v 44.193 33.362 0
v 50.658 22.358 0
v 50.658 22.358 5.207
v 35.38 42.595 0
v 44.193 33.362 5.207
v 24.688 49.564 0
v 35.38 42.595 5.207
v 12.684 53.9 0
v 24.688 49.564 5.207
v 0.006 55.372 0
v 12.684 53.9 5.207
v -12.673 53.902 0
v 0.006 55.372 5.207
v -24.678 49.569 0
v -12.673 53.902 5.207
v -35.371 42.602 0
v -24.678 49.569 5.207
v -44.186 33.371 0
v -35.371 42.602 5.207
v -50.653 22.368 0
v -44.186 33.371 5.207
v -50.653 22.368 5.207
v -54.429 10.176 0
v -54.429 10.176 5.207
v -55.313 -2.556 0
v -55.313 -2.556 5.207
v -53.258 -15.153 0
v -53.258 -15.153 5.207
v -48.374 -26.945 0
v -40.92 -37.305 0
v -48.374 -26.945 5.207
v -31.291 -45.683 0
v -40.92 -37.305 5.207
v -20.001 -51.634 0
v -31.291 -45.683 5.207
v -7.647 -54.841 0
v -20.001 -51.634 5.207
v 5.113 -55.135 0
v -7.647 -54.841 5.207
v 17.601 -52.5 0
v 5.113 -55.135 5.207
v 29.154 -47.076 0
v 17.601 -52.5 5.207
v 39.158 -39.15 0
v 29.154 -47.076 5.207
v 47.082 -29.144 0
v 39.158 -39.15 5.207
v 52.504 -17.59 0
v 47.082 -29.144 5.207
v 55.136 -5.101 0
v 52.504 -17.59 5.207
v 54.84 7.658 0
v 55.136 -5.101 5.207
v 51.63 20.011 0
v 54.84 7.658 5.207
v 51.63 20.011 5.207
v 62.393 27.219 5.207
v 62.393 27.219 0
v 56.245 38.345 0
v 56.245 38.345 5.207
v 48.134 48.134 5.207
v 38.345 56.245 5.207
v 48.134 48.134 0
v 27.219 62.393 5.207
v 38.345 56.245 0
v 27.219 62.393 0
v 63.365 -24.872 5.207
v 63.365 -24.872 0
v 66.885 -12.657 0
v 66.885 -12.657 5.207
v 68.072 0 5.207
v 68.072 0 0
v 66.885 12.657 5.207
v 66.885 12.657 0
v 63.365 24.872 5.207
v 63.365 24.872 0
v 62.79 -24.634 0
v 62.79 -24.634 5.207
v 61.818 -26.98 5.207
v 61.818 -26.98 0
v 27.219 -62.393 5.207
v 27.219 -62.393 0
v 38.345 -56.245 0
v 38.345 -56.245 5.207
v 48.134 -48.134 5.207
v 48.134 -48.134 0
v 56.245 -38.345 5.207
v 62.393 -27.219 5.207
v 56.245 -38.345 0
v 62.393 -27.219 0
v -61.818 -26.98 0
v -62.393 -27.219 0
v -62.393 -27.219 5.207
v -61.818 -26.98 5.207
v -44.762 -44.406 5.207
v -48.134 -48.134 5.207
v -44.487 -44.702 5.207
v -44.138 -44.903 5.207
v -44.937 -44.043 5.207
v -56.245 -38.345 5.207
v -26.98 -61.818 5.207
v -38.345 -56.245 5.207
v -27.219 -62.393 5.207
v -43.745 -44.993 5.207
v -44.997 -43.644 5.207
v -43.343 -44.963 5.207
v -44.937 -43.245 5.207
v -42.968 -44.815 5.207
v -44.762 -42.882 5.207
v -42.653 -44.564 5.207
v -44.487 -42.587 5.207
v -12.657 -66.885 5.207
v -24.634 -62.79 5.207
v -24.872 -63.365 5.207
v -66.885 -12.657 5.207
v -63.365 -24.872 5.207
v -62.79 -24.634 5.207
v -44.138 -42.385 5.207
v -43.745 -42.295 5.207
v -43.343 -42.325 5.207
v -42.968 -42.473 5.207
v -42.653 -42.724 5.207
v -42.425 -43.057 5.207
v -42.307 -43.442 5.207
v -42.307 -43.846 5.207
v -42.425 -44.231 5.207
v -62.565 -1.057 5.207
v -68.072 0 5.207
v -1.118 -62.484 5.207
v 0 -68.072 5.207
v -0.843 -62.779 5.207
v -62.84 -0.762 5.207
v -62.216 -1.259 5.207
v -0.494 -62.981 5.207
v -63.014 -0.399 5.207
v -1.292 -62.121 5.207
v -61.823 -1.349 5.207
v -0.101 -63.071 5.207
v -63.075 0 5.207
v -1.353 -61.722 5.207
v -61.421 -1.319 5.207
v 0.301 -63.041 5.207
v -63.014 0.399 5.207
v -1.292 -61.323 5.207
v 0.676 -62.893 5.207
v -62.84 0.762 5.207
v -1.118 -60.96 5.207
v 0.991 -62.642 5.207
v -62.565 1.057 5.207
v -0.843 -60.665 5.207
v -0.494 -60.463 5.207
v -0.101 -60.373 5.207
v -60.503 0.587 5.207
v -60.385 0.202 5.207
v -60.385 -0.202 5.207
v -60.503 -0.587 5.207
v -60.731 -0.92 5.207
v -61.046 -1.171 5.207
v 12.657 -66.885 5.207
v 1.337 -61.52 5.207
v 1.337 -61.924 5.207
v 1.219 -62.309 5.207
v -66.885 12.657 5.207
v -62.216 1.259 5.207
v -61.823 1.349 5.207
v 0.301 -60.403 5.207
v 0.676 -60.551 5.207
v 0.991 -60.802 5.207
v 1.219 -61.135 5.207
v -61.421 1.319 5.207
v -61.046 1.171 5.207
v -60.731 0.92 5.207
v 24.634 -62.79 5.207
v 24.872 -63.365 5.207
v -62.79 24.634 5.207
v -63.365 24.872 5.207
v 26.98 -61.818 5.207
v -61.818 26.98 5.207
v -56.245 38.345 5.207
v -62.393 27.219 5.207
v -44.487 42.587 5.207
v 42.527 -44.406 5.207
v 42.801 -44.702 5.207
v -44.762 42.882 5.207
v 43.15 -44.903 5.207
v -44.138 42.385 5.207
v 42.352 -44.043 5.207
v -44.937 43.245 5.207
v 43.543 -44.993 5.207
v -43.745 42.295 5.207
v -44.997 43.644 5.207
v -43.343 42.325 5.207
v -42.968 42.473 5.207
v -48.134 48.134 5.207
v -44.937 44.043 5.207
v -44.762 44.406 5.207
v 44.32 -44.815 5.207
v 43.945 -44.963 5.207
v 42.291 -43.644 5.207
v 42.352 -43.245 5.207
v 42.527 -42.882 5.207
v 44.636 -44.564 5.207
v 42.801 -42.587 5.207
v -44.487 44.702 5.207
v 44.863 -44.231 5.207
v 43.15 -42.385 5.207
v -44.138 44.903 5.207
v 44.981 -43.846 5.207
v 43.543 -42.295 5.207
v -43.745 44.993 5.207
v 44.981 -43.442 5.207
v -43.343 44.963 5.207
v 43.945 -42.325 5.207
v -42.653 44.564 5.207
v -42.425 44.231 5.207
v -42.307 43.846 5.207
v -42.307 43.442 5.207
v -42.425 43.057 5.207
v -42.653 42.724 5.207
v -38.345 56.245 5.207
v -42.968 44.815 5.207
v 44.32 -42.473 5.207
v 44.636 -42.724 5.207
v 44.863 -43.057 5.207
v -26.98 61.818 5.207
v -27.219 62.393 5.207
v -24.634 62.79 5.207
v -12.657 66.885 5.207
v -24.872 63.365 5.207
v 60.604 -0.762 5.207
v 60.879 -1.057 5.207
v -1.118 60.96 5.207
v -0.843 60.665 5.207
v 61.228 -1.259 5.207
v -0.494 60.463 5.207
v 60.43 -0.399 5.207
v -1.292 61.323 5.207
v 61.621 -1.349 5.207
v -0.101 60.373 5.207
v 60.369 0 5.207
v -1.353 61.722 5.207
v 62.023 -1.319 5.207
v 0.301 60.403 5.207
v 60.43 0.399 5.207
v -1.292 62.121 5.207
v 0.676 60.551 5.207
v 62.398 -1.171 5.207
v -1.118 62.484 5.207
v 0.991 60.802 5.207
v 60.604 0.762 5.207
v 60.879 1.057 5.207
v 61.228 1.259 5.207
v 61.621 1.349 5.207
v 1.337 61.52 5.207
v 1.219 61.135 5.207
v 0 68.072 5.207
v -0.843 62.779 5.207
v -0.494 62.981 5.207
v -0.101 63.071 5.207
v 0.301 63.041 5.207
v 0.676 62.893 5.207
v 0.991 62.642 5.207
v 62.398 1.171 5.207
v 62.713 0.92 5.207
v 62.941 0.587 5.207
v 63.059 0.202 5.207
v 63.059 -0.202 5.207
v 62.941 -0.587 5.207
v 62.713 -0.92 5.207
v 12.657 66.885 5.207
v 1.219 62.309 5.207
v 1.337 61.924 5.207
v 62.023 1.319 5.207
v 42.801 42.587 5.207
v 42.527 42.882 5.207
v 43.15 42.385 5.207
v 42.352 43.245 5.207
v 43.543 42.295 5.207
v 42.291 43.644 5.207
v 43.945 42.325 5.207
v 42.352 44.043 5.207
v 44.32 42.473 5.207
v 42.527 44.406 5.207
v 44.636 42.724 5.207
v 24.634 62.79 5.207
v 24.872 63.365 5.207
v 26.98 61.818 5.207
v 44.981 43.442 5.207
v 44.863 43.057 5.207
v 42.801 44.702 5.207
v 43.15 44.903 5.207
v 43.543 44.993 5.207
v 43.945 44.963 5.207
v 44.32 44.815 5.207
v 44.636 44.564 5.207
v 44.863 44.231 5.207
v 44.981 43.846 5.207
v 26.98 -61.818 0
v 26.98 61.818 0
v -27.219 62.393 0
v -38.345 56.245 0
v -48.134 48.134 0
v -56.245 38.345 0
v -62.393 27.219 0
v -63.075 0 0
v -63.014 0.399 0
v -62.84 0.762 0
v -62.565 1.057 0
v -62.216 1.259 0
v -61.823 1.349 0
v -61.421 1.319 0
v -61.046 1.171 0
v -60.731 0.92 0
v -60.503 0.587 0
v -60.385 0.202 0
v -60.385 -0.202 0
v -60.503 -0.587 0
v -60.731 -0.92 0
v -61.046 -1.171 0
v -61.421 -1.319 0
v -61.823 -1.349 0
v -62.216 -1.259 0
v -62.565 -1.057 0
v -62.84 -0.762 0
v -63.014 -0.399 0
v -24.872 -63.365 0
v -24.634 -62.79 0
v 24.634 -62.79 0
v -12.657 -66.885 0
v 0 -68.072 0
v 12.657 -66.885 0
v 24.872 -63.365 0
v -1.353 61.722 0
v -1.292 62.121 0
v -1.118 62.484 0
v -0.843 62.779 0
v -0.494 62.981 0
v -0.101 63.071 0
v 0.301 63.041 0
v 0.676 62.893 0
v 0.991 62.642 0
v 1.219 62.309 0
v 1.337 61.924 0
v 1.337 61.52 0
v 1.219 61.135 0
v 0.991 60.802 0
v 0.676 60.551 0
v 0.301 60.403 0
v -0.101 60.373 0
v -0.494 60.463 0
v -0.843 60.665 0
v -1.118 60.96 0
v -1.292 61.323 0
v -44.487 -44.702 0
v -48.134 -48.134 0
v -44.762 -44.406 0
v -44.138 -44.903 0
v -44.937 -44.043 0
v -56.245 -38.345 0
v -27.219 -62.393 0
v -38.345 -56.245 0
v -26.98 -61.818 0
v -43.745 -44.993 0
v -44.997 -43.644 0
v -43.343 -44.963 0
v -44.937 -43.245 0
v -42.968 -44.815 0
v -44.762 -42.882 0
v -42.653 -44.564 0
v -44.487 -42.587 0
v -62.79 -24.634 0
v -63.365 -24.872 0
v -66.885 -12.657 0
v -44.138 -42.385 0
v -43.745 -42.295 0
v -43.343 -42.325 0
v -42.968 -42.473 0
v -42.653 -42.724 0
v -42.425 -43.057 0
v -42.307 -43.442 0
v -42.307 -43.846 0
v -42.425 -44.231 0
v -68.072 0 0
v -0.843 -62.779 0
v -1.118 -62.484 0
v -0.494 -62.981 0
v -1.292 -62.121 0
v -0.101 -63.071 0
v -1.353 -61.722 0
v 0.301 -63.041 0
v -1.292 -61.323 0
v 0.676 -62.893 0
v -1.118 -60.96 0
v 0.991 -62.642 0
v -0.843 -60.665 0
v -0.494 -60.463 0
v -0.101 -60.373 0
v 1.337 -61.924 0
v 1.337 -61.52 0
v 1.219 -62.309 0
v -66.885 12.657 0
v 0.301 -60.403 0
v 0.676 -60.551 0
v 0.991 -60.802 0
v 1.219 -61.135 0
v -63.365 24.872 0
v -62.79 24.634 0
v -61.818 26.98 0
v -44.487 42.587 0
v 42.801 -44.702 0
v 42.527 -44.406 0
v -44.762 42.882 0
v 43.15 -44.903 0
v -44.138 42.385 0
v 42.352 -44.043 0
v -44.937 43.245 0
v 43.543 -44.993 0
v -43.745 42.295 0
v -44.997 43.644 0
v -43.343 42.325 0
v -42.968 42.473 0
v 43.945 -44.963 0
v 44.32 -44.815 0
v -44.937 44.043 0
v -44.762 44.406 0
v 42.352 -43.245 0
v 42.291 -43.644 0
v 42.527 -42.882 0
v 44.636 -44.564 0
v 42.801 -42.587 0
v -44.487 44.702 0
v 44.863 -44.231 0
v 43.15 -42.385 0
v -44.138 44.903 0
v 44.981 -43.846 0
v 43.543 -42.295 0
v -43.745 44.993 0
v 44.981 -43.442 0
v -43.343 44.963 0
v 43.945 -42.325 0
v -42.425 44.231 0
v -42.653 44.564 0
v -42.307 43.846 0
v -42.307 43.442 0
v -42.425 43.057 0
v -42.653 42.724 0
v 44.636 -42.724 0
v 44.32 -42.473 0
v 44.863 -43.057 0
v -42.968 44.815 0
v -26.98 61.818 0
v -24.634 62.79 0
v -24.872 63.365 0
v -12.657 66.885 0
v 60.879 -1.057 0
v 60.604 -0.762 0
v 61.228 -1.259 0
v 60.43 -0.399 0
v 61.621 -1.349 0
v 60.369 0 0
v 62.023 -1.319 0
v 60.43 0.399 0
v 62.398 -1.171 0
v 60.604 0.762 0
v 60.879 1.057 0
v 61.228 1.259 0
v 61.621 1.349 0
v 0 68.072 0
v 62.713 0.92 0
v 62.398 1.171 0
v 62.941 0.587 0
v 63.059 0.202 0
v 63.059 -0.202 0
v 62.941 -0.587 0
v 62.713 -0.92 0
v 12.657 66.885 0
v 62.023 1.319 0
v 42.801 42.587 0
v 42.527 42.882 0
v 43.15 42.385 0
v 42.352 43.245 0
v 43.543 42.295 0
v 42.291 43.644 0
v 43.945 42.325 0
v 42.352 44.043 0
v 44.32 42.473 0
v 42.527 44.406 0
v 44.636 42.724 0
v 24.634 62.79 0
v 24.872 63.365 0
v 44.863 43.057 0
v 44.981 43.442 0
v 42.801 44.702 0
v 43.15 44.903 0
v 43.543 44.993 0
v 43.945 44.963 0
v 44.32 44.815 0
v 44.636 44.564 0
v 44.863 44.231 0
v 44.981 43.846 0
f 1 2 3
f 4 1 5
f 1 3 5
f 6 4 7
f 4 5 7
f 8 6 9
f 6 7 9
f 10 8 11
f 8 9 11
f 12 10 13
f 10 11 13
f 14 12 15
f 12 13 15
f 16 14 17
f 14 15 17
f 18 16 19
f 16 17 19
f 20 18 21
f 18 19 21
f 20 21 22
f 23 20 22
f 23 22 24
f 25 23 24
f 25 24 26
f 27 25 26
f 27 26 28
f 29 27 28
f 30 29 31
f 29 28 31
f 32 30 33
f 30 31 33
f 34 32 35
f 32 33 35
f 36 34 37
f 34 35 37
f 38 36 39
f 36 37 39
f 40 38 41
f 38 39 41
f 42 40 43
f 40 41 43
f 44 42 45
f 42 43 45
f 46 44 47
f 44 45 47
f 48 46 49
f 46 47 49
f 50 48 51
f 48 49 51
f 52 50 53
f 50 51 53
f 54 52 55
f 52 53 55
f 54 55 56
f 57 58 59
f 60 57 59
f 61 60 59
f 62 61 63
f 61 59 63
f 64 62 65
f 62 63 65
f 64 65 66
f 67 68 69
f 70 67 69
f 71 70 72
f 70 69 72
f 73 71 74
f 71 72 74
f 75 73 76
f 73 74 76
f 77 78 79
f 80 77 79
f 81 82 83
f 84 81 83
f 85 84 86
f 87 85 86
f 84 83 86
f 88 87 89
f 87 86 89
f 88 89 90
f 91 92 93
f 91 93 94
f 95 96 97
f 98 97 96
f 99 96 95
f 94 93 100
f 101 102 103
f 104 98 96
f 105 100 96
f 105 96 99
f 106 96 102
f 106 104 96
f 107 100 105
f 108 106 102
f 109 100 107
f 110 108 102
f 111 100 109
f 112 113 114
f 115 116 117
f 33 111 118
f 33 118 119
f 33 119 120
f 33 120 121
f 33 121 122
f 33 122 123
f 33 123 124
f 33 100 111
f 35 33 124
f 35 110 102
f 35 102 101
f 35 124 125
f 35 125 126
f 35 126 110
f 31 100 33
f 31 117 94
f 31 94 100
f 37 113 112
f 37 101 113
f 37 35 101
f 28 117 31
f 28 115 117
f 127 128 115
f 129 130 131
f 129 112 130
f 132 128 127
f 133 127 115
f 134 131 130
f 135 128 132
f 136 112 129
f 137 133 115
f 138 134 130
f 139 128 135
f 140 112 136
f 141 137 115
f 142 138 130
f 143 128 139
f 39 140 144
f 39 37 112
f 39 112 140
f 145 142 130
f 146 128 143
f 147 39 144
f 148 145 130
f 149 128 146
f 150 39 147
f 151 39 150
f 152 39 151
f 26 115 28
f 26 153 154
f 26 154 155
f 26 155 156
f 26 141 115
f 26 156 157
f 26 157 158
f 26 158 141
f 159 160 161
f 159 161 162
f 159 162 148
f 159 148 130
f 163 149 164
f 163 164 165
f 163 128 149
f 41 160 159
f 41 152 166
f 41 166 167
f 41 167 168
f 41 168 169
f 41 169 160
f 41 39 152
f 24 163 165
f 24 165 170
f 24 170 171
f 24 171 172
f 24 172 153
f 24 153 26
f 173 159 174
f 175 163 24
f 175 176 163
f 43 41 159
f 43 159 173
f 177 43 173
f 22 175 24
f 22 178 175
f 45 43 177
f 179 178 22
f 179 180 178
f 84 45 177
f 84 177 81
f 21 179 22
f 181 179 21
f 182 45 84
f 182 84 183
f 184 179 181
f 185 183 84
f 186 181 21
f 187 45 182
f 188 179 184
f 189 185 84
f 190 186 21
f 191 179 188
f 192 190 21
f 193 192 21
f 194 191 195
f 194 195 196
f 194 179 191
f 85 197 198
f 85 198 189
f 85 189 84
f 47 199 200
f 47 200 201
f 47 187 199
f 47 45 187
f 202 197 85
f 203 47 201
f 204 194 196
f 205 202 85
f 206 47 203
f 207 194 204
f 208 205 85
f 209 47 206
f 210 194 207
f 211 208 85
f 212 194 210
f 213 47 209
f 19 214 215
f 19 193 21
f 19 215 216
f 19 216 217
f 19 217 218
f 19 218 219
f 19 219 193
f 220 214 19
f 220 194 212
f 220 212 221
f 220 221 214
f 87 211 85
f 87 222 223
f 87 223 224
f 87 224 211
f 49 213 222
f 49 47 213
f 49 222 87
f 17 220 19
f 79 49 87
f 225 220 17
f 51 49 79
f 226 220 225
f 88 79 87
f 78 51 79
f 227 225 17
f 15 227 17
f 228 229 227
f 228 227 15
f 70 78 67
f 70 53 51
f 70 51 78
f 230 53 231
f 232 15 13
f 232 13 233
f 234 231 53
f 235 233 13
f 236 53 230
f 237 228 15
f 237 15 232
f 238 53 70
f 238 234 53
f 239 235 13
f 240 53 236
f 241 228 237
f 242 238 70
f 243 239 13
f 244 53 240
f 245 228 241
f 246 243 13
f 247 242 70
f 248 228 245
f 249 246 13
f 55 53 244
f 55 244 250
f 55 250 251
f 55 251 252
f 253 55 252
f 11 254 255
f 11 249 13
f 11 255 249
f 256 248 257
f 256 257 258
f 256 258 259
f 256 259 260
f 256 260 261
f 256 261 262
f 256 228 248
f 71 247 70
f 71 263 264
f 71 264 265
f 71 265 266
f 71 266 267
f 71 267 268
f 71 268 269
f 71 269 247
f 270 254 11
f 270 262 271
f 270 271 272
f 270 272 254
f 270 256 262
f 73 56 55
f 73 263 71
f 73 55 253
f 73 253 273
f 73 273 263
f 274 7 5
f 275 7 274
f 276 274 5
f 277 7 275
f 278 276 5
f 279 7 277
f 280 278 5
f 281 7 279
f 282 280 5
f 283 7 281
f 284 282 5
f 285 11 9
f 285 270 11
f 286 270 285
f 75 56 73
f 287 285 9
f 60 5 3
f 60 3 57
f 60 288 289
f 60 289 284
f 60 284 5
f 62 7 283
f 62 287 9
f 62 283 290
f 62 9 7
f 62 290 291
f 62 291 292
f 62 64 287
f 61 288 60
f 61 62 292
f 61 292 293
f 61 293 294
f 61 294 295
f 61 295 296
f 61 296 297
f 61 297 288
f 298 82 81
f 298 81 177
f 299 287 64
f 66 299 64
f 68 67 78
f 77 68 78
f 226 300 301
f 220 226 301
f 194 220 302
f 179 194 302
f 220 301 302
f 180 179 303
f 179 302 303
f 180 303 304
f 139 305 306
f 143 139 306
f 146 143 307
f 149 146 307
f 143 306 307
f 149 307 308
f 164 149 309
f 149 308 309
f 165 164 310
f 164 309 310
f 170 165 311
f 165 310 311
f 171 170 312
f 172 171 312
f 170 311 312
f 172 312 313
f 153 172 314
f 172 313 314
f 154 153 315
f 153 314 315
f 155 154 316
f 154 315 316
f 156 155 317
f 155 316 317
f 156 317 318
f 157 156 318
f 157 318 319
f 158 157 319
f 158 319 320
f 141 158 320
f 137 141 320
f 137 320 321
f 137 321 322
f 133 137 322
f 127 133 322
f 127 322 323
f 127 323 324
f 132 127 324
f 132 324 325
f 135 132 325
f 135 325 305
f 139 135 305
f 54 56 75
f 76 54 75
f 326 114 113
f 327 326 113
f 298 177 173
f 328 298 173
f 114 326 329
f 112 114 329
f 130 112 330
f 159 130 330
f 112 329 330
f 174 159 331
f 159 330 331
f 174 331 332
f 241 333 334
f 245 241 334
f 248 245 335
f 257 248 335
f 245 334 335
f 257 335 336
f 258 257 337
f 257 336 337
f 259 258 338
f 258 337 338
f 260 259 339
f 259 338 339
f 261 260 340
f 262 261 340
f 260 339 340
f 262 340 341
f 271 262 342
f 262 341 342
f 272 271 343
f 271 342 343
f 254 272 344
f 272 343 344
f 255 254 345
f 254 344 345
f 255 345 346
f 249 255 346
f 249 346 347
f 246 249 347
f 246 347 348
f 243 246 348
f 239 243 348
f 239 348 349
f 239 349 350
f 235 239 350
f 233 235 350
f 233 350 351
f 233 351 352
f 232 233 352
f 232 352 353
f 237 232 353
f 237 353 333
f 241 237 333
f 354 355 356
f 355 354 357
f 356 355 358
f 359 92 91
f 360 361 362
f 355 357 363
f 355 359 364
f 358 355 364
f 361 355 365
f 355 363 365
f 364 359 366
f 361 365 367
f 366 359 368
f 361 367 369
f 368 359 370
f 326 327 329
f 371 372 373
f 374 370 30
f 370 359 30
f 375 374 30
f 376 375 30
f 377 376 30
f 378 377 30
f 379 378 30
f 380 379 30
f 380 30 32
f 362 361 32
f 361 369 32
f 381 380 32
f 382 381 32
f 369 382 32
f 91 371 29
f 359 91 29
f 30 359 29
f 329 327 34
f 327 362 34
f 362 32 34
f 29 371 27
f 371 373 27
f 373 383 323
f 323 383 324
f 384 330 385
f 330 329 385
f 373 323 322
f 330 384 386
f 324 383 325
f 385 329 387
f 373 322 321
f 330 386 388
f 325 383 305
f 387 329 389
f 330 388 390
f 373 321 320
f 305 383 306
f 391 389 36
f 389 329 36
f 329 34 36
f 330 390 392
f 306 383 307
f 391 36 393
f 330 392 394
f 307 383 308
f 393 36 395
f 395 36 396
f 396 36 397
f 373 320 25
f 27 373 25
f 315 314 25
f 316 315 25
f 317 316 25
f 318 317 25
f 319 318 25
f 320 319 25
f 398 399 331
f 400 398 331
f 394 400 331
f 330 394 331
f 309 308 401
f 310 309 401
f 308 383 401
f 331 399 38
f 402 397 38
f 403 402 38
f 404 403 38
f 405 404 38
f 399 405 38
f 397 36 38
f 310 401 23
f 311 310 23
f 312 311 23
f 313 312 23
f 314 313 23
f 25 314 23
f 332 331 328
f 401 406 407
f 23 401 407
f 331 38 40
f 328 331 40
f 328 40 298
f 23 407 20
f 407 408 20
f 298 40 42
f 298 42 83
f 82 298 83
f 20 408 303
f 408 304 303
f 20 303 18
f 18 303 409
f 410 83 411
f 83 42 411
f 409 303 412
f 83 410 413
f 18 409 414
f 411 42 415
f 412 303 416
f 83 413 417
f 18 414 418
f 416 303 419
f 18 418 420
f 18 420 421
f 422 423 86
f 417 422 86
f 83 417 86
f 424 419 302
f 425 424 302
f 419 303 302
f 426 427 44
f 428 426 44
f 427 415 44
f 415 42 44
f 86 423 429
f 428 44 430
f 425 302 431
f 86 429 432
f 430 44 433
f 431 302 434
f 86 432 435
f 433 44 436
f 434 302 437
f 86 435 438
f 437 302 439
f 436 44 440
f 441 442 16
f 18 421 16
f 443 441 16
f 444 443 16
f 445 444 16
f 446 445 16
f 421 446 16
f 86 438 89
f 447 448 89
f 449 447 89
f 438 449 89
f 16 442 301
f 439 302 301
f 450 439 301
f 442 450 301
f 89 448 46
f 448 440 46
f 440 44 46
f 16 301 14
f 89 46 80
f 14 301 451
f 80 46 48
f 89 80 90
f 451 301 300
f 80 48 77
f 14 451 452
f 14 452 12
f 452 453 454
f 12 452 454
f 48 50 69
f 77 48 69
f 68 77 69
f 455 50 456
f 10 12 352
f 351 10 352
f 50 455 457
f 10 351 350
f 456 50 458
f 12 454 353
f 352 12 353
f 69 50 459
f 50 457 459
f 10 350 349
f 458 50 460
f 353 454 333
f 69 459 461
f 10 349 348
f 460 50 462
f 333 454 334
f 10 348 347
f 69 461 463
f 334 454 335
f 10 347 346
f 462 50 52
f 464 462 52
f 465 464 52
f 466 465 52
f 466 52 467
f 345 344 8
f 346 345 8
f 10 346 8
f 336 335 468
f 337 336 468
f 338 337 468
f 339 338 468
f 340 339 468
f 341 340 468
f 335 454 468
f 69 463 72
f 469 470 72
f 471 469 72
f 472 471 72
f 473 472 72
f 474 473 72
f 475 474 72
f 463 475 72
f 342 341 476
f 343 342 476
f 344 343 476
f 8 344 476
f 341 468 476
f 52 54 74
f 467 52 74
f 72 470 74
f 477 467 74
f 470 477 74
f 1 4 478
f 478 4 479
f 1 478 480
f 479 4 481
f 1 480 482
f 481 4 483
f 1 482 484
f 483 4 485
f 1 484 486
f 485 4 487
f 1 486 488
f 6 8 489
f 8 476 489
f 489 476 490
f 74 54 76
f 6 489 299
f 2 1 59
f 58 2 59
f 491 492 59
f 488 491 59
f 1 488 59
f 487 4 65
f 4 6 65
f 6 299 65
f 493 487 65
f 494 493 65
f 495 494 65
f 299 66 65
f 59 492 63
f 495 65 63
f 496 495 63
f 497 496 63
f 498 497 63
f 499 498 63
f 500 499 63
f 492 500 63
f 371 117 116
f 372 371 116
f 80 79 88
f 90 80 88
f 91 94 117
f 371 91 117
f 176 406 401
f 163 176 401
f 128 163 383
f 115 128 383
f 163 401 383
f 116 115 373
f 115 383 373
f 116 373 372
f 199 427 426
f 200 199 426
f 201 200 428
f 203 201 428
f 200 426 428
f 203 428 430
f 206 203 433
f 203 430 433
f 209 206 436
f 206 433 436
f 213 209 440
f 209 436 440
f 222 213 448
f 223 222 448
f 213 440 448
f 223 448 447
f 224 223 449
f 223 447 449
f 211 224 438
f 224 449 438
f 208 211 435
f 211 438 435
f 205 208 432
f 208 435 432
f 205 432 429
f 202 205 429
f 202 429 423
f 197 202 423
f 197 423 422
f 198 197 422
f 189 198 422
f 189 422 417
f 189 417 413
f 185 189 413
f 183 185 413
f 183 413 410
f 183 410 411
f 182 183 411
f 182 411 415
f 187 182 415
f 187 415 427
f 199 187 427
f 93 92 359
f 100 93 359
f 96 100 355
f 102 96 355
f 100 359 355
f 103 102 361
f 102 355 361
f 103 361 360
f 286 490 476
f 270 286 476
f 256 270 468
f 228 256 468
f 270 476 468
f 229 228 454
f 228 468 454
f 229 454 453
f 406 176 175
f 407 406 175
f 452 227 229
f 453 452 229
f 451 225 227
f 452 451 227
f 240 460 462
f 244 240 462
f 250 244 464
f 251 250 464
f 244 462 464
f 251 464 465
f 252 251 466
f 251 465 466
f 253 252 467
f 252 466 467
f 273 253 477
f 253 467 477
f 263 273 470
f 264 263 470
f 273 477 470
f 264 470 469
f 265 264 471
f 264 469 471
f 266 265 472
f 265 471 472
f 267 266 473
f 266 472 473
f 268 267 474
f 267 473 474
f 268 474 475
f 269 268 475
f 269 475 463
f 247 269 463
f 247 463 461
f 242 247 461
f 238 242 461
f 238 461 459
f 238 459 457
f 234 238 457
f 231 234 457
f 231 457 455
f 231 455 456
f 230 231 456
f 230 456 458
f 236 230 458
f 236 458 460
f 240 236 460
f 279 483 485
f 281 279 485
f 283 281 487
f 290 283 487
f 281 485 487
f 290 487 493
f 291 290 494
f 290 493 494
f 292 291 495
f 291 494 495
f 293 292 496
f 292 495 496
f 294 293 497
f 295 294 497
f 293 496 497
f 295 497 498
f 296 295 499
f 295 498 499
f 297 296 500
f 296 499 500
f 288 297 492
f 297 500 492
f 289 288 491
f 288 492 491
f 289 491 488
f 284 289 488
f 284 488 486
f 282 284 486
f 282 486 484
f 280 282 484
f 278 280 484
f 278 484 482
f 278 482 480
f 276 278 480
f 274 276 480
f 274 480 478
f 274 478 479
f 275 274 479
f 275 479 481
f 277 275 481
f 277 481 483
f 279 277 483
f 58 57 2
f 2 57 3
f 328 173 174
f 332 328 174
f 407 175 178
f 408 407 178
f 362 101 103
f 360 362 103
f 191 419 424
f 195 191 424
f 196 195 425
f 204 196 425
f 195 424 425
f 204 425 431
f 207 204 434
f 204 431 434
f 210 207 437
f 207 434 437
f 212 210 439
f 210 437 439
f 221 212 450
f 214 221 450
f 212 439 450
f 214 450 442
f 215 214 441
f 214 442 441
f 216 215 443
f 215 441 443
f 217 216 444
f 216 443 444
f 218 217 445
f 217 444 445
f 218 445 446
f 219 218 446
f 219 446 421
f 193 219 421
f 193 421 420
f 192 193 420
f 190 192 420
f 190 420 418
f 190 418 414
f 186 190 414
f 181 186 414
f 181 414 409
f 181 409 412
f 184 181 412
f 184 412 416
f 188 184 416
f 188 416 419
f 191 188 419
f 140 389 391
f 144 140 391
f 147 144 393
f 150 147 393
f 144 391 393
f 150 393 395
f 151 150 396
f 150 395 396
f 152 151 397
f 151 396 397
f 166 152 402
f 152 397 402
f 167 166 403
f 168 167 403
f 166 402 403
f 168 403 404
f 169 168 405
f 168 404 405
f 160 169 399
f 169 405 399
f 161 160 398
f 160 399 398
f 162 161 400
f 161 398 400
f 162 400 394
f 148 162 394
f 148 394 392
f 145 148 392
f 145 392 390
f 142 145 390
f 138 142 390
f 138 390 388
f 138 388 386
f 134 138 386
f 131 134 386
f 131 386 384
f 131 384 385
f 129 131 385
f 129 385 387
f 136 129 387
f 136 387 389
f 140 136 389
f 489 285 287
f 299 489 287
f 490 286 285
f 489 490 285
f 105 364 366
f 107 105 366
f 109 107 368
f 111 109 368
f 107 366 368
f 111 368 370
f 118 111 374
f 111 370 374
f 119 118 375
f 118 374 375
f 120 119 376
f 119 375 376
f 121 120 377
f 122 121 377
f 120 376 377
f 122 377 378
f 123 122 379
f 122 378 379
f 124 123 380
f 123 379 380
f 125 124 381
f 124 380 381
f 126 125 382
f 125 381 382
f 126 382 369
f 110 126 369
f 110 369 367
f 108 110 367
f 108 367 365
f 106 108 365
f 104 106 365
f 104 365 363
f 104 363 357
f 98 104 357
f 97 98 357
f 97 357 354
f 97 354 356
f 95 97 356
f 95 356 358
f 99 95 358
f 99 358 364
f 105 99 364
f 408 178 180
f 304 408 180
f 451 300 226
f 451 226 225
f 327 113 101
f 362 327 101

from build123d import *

# Parameters (mm, degrees)
SKETCH4_R             = 68.072
BOSS_EXTRUDE2_DEPTH   = 5.207
SKETCH5_R             = 55.372
CUT_EXTRUDE5_DEPTH    = 6.207
CUT_EXTRUDE11_DEPTH   = 6.207
F_6_32_TAPPED_HOLE1_D = 2.7051


with BuildPart() as part:
    # Sketch4 → Boss-Extrude2 (new body)
    with BuildSketch(Plane.XY):
        Circle(SKETCH4_R)
    extrude(amount=BOSS_EXTRUDE2_DEPTH)

    # Sketch5 → Cut-Extrude5 (cut, through all)
    with BuildSketch(Plane.XY.offset(5.207)):
        Circle(SKETCH5_R)
    extrude(amount=-CUT_EXTRUDE5_DEPTH, mode=Mode.SUBTRACT)

    # Sketch8 → Cut-Extrude11 (cut, through all)
    with BuildSketch(Plane.XY.offset(5.207)):
        Polygon((68.857618113, 29.896397389), (50.084386012, 22.120270044), (51.05640193, 19.773616031), (69.829634031, 27.549743377), align=None)
        Polygon((27.466357594, 62.990983081), (25.119703581, 63.962998999), (24.633695622, 62.789671993), (26.980349635, 61.817656075), align=None)
        Polygon((-25.119703581, 63.962998999), (-27.466357594, 62.990983081), (-26.980349635, 61.817656075), (-24.633695622, 62.789671993), align=None)
        Polygon((-62.990983081, 27.466357594), (-63.962998999, 25.119703581), (-62.789671993, 24.633695622), (-61.817656075, 26.980349635), align=None)
        Polygon((-63.962998999, -25.119703581), (-62.990983081, -27.466357594), (-61.817656075, -26.980349635), (-62.789671993, -24.633695622), align=None)
        Polygon((-27.466357594, -62.990983081), (-25.119703581, -63.962998999), (-24.633695622, -62.789671993), (-26.980349635, -61.817656075), align=None)
        Polygon((25.119703581, -63.962998999), (27.466357594, -62.990983081), (26.980349635, -61.817656075), (24.633695622, -62.789671993), align=None)
        Polygon((62.990983081, -27.466357594), (63.962998999, -25.119703581), (62.789671993, -24.633695622), (61.817656075, -26.980349635), align=None)
    extrude(amount=-CUT_EXTRUDE11_DEPTH, mode=Mode.SUBTRACT)

    # #6-32 Tapped Hole1 (through all)
    with Locations(Plane.XY.offset(5.207)):
        with Locations((61.722, 0), (43.644044748, -43.644044748), (0, -61.722), (-43.644044748, -43.644044748), (-61.722, 0), (-43.644044748, 43.644044748), (0, 61.722), (43.644044748, 43.644044748)):
            Hole(F_6_32_TAPPED_HOLE1_D / 2)


solid = part.part
